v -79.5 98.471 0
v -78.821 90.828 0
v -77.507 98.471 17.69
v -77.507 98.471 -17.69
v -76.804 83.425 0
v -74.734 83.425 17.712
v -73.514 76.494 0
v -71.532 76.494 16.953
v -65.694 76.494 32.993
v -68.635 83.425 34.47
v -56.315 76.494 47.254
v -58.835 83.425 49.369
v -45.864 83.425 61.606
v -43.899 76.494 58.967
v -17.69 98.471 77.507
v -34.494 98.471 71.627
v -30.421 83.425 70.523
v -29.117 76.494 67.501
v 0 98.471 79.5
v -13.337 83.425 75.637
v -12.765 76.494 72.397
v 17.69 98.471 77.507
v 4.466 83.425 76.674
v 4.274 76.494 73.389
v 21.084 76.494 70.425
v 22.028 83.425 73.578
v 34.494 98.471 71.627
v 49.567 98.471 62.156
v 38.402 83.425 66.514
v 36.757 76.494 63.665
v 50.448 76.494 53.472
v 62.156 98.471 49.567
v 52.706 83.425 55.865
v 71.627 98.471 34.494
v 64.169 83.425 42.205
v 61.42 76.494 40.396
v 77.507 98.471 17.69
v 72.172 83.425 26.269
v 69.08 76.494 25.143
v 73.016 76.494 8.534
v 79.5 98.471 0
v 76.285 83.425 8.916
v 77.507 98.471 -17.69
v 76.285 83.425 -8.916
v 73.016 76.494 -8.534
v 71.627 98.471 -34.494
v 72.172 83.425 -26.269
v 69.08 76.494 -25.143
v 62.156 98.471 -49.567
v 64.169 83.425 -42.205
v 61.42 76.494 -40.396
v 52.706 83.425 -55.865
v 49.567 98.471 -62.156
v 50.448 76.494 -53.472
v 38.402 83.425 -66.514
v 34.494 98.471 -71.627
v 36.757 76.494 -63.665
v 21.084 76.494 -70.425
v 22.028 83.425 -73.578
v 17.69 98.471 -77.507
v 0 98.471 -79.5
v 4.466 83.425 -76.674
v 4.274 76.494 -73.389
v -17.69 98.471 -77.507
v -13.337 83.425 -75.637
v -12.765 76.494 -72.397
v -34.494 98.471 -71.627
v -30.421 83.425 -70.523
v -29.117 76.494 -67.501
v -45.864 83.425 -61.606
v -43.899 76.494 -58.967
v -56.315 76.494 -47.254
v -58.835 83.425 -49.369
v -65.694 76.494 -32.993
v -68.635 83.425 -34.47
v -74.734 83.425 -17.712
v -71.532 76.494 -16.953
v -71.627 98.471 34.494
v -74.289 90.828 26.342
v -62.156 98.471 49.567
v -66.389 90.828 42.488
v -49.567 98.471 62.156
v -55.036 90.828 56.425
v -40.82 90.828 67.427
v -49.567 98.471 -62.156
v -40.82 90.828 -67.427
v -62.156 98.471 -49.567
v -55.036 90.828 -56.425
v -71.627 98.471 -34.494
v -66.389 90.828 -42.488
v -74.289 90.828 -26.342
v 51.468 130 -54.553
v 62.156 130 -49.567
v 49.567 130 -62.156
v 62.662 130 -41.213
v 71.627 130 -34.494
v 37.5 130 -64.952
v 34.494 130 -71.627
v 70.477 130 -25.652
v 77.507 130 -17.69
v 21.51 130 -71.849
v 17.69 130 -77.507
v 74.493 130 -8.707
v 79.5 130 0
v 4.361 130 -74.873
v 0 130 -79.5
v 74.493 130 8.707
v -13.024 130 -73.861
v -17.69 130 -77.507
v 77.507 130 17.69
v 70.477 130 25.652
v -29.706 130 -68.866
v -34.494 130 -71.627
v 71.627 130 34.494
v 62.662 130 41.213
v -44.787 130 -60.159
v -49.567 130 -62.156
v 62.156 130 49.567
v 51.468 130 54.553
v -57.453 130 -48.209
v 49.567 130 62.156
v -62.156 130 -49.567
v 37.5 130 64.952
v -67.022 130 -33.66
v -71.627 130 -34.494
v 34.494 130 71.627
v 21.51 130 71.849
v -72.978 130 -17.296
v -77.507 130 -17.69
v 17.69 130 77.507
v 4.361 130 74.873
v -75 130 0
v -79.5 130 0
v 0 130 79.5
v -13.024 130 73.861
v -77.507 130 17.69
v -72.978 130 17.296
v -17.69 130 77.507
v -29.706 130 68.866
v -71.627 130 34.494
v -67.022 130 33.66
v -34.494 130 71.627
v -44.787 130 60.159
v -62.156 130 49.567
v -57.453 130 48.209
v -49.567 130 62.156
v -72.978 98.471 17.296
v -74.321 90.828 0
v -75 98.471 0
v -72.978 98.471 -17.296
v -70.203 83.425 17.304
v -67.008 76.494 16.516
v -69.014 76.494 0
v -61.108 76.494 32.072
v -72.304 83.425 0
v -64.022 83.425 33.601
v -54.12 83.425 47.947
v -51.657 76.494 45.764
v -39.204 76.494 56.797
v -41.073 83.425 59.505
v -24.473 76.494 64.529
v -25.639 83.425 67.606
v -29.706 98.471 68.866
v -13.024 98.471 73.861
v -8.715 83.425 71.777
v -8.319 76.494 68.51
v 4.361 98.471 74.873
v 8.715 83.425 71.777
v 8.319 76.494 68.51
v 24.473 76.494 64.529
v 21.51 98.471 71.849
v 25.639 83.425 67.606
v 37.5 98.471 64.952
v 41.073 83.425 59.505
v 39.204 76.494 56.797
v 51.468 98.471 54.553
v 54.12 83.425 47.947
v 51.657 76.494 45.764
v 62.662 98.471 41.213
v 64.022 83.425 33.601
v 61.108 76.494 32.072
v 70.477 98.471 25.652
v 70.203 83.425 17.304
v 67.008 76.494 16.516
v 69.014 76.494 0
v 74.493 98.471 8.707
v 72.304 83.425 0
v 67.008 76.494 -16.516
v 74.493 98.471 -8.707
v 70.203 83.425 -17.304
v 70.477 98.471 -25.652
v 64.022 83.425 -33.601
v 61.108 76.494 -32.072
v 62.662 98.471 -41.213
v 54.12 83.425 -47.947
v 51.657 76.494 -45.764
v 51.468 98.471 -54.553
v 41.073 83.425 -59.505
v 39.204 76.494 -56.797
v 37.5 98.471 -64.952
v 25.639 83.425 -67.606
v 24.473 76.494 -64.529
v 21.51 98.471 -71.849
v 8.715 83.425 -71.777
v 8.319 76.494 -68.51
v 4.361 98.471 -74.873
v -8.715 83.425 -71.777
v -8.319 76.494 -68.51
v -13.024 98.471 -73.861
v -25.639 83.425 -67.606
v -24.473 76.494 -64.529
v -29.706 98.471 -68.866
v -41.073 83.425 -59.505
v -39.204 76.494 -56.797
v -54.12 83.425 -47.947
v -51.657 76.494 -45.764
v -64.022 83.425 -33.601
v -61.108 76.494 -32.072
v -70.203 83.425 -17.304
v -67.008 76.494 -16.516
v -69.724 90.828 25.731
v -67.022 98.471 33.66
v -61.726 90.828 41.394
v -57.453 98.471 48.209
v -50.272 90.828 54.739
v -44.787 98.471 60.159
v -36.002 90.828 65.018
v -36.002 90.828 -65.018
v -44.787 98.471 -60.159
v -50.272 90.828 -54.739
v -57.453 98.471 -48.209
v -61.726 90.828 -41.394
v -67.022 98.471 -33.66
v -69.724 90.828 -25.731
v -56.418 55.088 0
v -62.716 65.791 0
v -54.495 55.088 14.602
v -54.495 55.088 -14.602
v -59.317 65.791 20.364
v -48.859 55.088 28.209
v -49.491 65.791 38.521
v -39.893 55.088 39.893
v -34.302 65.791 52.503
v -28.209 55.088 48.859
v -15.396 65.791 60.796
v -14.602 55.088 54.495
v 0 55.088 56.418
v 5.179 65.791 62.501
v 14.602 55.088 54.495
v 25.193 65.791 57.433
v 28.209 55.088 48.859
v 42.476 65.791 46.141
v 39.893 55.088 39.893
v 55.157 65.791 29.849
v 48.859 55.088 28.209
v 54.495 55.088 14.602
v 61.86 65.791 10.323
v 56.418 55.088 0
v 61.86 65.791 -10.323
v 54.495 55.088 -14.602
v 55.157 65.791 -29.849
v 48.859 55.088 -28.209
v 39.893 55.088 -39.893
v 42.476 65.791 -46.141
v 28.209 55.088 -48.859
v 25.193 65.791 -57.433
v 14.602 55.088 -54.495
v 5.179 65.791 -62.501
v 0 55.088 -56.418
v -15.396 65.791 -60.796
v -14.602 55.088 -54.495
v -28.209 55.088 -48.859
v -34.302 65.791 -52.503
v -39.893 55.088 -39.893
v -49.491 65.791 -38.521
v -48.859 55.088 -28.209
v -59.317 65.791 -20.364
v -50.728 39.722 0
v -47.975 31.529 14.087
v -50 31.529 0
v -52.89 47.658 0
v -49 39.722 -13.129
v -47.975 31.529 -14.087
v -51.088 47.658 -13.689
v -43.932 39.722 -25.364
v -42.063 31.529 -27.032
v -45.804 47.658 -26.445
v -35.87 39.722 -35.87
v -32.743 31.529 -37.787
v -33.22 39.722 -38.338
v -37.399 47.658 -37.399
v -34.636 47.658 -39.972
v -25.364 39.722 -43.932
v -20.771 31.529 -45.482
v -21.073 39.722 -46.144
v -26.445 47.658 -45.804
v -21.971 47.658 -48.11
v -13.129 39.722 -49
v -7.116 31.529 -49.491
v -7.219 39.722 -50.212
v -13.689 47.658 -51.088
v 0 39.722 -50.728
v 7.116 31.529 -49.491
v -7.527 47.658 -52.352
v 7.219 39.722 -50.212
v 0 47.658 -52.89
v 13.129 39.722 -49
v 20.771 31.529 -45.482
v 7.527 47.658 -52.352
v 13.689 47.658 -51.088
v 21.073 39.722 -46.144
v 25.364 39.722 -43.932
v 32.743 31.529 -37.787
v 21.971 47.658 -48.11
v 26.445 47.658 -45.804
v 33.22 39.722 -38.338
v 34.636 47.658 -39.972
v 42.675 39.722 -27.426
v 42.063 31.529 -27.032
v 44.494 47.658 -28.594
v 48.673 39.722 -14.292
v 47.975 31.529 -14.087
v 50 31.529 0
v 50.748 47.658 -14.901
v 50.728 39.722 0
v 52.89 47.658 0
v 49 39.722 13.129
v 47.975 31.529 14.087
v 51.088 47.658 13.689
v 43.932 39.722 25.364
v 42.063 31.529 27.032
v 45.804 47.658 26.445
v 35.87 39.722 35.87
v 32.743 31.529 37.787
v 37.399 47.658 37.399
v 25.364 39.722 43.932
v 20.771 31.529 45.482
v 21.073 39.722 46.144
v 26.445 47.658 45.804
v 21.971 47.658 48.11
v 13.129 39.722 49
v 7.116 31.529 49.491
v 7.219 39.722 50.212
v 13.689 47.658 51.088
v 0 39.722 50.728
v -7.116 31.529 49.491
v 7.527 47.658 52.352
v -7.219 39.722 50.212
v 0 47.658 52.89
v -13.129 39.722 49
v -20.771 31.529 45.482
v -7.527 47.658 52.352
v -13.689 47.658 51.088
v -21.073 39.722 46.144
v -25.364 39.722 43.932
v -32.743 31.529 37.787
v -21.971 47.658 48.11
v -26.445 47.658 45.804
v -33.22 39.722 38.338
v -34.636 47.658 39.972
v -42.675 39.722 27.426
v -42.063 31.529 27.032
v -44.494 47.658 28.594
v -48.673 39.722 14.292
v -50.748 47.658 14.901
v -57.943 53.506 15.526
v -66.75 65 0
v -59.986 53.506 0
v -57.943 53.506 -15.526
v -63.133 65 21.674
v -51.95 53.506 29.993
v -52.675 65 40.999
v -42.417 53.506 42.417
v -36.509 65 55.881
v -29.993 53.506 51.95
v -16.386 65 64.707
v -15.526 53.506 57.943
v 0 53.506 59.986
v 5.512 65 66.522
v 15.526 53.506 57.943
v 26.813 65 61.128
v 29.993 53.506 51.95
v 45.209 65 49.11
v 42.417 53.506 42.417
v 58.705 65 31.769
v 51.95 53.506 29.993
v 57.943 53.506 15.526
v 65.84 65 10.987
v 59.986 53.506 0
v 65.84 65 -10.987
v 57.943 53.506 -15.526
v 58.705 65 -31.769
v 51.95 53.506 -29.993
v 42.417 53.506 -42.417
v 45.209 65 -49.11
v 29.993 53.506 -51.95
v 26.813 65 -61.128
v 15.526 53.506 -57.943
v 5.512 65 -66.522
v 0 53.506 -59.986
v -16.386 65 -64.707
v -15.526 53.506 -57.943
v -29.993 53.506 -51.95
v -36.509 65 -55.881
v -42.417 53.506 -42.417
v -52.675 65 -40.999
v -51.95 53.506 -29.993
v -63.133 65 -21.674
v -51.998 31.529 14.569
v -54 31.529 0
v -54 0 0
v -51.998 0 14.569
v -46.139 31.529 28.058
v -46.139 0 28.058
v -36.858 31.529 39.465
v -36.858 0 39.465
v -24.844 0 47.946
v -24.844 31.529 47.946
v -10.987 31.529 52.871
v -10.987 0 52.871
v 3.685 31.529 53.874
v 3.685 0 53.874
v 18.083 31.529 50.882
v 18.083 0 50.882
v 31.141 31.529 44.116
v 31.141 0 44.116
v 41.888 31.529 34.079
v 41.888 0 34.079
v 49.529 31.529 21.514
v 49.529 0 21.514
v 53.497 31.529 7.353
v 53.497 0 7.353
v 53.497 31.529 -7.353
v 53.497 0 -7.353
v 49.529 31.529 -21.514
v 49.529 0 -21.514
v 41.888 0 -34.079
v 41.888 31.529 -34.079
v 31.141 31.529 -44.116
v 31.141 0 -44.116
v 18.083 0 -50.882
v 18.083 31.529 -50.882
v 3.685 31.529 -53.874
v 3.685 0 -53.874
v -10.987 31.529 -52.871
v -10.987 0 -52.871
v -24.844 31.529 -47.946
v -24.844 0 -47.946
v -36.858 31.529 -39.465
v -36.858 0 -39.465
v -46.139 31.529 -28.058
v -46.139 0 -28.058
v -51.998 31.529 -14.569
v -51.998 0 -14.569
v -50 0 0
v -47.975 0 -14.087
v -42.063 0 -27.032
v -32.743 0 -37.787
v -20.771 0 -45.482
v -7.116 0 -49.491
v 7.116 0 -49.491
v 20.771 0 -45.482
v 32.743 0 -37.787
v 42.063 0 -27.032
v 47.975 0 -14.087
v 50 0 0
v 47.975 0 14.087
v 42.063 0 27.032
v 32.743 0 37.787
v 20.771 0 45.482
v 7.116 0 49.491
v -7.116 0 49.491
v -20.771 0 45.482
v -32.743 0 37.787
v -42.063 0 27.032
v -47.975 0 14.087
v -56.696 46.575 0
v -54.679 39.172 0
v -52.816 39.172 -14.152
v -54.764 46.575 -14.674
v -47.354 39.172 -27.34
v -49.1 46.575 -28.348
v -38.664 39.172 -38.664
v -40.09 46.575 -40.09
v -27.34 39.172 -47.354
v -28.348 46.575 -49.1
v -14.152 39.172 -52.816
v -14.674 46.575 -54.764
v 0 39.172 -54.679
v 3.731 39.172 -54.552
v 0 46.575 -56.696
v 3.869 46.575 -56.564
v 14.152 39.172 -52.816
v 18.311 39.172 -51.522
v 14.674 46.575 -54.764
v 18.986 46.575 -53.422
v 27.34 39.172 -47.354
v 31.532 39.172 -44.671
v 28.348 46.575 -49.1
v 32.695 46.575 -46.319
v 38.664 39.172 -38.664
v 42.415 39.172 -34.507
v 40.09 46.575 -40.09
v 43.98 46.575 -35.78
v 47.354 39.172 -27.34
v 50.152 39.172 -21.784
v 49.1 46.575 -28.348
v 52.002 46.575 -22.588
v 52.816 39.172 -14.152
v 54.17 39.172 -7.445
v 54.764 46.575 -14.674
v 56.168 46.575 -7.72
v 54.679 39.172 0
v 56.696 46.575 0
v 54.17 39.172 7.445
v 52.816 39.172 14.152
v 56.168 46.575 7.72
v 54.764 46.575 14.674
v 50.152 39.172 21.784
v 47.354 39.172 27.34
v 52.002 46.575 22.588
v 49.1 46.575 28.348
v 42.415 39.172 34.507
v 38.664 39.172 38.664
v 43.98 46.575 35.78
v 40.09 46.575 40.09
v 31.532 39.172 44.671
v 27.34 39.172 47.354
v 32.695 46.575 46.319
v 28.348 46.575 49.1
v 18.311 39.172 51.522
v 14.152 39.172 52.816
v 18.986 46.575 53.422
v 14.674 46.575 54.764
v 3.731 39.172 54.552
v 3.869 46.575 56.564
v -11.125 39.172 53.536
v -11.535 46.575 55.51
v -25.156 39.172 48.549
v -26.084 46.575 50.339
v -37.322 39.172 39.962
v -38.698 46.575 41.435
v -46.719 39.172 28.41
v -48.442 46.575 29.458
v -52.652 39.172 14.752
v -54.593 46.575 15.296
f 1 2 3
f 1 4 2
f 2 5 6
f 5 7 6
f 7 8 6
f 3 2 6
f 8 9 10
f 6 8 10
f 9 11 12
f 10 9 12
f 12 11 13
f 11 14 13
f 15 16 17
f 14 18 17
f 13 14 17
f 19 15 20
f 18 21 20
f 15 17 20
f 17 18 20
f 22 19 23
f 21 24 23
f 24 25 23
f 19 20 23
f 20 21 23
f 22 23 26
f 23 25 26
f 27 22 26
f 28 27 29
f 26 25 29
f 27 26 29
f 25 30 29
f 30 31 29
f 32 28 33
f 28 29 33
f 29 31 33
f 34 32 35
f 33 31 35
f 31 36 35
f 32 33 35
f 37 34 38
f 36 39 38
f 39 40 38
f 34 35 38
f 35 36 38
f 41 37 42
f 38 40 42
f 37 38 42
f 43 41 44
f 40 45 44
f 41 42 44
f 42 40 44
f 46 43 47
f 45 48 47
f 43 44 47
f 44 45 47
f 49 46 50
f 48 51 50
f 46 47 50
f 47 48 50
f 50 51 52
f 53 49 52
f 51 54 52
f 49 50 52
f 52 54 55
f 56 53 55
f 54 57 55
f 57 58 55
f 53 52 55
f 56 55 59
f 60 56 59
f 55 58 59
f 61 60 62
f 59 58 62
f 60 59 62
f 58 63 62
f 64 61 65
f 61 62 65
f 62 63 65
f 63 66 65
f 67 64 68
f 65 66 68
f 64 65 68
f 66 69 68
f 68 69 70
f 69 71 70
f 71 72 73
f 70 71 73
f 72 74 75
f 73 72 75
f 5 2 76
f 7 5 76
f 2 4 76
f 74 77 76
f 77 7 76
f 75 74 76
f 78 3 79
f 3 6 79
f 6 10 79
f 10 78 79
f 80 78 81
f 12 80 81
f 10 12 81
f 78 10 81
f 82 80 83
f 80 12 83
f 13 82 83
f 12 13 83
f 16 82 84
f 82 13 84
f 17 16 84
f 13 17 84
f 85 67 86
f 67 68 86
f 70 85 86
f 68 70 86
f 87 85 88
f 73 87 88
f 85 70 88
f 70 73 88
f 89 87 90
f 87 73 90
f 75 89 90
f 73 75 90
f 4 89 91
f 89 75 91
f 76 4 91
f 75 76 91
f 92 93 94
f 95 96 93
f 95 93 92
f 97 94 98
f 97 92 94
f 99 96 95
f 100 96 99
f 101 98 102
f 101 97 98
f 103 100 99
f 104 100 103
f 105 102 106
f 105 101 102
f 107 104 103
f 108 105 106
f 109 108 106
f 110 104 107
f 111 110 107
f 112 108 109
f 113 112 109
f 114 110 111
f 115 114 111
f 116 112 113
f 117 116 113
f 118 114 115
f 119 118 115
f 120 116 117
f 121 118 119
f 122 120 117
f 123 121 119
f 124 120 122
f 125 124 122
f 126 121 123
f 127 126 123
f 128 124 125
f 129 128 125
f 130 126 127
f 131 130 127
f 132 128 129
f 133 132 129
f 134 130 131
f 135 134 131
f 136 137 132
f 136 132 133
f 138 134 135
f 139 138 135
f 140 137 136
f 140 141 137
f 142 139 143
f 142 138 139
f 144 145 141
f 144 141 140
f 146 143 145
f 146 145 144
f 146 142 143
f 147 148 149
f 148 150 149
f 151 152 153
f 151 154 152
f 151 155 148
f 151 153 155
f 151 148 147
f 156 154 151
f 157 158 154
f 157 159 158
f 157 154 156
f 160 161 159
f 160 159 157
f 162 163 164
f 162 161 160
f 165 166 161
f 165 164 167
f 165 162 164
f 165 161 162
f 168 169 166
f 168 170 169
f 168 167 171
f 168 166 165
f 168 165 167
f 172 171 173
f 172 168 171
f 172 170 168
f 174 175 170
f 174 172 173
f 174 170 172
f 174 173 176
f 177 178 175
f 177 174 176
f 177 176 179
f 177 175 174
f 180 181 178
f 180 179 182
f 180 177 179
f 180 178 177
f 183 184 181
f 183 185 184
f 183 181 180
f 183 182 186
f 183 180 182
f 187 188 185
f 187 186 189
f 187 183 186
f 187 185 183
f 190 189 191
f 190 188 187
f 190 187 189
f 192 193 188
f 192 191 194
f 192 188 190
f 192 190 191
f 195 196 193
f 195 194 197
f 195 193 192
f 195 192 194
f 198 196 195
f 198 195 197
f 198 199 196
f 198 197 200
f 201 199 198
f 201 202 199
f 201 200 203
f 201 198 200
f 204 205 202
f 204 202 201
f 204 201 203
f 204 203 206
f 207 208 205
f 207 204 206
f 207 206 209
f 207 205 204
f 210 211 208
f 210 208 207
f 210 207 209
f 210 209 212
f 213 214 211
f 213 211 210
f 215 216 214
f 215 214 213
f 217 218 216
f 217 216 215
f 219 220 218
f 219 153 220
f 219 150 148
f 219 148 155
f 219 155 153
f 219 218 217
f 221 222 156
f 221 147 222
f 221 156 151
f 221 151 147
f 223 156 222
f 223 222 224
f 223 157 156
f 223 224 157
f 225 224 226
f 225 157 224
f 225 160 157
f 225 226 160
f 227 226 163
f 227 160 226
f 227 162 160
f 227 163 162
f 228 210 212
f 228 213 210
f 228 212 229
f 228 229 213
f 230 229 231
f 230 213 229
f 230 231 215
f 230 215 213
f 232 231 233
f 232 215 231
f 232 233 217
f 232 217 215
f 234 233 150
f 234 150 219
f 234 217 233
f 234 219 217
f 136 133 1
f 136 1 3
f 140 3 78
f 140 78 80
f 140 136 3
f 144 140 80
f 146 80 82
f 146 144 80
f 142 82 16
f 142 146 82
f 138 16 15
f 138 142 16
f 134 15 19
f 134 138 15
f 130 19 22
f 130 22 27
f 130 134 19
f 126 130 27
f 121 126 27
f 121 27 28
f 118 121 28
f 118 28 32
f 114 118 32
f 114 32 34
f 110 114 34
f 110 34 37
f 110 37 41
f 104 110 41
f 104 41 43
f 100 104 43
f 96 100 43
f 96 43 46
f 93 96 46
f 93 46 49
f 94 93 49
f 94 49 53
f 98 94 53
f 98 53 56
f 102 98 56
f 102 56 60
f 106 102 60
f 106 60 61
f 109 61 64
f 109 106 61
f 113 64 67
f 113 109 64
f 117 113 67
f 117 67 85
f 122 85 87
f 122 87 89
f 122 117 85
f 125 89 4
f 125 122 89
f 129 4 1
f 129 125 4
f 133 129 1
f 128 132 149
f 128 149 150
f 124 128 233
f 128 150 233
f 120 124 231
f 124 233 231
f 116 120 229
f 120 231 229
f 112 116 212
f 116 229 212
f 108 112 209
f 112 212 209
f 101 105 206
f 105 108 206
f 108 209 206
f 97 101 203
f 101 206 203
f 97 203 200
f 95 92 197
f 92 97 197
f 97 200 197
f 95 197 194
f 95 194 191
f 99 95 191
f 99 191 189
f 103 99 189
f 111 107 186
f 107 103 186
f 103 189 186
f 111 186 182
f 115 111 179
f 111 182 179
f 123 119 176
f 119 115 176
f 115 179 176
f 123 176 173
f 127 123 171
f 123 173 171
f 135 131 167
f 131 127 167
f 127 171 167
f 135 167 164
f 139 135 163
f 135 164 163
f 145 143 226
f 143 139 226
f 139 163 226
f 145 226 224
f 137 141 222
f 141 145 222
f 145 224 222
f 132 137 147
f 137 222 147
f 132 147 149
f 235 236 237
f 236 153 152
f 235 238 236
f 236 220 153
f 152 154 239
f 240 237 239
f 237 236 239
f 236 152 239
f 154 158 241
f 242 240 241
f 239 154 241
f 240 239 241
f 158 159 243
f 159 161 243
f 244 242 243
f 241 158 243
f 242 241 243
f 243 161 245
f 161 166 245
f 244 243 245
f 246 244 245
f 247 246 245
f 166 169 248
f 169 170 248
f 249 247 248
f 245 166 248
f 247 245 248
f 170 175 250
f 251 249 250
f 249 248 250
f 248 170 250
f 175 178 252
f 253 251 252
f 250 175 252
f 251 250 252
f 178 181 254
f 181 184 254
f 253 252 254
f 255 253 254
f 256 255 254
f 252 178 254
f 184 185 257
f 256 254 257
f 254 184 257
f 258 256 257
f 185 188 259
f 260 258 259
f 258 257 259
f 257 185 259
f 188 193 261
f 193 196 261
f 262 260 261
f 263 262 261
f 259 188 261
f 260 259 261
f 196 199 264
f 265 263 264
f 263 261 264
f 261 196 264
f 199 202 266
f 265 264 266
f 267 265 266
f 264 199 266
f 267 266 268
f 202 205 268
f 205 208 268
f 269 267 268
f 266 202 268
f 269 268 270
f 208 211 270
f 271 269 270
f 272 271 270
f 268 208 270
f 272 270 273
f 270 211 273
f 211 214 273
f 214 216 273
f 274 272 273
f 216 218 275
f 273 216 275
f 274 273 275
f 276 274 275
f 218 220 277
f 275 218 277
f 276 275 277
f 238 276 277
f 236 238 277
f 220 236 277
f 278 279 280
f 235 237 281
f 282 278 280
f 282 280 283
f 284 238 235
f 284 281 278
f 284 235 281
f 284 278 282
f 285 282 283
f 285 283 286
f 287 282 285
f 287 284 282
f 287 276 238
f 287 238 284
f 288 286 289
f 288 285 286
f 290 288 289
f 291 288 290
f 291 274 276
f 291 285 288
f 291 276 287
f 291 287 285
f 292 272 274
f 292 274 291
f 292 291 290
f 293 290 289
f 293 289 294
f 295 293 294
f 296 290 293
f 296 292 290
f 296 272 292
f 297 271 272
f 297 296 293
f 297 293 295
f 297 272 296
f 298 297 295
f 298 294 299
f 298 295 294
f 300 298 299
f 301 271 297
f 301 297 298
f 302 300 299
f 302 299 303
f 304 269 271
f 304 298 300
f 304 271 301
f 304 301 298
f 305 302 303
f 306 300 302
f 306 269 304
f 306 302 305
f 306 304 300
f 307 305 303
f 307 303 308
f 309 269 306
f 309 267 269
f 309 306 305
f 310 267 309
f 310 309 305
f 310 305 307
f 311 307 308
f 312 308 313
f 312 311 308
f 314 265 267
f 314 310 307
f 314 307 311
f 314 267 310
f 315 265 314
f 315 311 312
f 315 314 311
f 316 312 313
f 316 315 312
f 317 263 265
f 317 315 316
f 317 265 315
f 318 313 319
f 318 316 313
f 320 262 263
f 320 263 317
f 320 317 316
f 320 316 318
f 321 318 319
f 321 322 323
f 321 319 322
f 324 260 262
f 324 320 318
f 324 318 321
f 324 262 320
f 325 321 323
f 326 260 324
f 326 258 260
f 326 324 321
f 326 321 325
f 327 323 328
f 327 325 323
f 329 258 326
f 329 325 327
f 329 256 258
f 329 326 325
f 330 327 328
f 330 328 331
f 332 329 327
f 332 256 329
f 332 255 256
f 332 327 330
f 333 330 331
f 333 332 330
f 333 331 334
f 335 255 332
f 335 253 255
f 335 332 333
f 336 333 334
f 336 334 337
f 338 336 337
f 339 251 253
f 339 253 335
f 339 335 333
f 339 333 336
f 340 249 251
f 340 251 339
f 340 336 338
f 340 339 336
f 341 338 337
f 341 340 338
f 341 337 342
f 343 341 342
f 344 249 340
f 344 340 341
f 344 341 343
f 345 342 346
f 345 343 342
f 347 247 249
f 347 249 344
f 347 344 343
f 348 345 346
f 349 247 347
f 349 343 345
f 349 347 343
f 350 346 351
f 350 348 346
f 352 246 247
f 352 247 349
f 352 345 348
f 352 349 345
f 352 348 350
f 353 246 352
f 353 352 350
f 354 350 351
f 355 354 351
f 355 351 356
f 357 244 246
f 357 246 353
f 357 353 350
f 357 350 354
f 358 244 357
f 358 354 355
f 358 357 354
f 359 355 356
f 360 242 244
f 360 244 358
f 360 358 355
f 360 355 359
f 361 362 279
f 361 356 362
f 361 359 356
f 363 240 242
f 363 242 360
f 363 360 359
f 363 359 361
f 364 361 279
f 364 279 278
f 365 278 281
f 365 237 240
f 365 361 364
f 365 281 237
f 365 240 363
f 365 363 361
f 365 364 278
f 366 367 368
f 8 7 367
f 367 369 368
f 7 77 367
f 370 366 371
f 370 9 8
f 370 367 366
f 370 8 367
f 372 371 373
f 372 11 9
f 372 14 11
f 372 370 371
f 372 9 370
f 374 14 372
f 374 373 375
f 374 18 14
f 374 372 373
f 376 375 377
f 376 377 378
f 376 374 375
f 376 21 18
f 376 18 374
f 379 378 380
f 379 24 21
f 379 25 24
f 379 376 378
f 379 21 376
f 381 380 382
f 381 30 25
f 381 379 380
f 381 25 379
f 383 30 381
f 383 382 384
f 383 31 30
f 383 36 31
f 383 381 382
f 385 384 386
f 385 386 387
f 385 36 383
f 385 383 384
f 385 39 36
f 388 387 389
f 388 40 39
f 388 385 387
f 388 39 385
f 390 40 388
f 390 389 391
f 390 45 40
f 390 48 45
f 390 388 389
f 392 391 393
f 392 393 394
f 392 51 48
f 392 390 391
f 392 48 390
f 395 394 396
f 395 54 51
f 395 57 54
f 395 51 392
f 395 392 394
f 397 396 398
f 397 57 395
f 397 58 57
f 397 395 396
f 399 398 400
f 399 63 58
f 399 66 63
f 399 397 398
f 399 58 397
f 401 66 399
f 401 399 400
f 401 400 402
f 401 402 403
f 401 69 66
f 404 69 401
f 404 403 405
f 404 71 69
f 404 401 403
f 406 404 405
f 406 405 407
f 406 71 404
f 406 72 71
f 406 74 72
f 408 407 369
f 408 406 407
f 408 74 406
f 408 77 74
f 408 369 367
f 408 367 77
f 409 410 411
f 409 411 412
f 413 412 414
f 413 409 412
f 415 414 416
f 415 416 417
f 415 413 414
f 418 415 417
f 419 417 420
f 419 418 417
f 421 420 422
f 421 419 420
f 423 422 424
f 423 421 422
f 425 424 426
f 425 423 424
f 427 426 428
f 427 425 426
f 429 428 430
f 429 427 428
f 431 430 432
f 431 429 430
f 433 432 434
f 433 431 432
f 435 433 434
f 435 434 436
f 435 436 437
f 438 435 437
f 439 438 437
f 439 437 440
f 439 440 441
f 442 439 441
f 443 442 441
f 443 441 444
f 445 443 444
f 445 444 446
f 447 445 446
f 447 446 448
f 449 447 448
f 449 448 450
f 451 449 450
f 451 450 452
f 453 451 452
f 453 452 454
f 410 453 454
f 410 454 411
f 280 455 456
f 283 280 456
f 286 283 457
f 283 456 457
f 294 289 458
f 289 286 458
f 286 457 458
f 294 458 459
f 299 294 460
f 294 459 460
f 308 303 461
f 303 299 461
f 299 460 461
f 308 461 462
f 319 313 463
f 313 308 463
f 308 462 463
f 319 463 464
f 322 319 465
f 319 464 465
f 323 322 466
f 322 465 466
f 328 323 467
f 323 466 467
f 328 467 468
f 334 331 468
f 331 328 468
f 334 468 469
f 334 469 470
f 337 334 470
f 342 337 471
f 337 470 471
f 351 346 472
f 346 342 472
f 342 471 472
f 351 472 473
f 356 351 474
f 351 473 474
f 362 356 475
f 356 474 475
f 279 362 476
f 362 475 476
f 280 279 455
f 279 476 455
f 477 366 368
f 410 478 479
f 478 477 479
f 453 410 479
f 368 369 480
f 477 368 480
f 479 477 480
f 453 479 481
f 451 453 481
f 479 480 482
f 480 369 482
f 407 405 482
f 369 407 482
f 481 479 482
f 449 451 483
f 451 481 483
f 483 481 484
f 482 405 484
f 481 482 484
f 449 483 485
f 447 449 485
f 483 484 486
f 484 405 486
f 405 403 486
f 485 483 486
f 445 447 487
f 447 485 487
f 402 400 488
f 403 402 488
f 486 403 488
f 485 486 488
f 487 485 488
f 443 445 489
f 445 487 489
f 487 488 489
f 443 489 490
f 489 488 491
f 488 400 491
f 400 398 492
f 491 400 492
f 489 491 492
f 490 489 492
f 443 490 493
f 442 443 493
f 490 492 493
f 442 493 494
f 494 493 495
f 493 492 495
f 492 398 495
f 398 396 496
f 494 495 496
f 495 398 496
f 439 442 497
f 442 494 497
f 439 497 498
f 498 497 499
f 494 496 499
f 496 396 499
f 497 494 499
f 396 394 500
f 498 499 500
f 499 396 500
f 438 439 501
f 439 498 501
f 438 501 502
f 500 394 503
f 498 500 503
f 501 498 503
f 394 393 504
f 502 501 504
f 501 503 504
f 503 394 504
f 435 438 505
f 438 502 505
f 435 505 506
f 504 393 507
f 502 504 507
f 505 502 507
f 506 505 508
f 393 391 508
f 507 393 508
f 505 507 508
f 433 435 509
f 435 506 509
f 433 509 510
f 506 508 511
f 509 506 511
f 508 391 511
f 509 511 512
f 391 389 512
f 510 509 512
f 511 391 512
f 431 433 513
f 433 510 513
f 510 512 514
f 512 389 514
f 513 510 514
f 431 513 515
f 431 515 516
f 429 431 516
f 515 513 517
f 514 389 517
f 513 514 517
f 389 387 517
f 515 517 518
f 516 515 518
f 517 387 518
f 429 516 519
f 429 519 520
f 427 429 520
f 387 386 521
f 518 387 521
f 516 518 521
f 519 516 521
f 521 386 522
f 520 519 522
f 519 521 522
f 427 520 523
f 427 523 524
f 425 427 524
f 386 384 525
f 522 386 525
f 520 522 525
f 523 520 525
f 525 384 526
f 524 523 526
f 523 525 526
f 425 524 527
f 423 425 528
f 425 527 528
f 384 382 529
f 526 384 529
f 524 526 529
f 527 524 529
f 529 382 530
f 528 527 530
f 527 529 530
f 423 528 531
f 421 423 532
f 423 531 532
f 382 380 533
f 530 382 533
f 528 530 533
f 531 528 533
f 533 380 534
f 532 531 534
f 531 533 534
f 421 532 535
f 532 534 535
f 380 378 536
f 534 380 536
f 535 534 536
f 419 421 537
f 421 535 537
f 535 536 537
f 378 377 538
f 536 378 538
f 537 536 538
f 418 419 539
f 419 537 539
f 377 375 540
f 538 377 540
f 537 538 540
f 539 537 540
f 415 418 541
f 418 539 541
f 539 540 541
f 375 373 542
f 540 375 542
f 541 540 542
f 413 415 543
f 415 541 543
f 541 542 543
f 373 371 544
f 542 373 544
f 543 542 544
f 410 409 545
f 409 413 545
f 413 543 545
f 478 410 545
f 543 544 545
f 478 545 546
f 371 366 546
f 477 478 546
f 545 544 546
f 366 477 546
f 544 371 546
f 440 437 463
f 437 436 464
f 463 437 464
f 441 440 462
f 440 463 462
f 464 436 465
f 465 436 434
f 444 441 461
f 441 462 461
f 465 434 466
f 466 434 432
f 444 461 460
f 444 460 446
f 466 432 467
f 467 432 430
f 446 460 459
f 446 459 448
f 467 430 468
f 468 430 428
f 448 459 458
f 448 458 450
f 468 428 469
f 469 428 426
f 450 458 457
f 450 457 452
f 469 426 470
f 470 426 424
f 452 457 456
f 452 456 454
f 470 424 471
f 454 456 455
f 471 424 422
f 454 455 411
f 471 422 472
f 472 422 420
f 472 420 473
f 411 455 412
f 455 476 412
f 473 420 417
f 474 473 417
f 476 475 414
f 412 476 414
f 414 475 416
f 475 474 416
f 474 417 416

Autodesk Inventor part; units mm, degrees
ref_plane "YZ Plane" through (0, 0, 0) normal (1, 0, 0) x (0, 1, 0)
ref_plane "XZ Plane" through (0, 0, 0) normal (0, 1, 0) x (-1, 0, 0)
ref_plane "XY Plane" through (0, 0, 0) normal (0, 0, 1) x (1, 0, 0)
sketch "Sketch1" plane through (0, 0, 0) normal (0, 0, 1) x (1, 0, 0)
  line L0 (0, 0) -> (0, 130)
  line L1 (-54, 0) -> (-54, 31.5294)
  line L2 (-79.5, 98.4706) -> (-79.5, 130)
  line L3 (-79.5, 130) -> (-75, 130)
  line L4 (-75, 130) -> (-75, 98.4706)
  line L5 (-50, 31.5294) -> (-50, 0)
  line L6 (-73.5135, 76.4935) -> (-59.9865, 53.5065)
  line L7 (-69.0135, 76.4935) -> (-56.4175, 55.0885)
  arc A0 (-75, 98.4706) -> (-69.0135, 76.4935) centre (-31.6667, 98.4706) ccw
  arc A1 (-79.5, 98.4706) -> (-73.5135, 76.4935) centre (-36.1667, 98.4706) ccw
  arc A2 (-54, 31.5294) -> (-59.9865, 53.5065) centre (-97.3333, 31.5294) ccw
  arc A3 (-50, 31.5294) -> (-56.4175, 55.0885) centre (-96.4526, 31.5294) ccw
  line L8 (-54, 0) -> (-50, 0)
  point P0 (-54, 43.3333)
  point P1 (-79.5, 86.6667)
  point P2 (-77.25, 130)
  point P3 (-52, 0)
  dimension "d0" = 4
  dimension "d1" = 108
  dimension "d2" = 4.5
  dimension "d3" = 159
  dimension "d5" = 43.3333
  dimension "d6" = 43.3333
  dimension "d8" = 43.3333
  dimension "d13" = 130
  dimension "d15" = 43.3333
revolve "Revolution1" add sketch "Sketch1" angle 360 about axis through (0, 0, 0) along (0, 1, 0)
equation "\"d0\" = s1"
equation "\"d1\" = dh_"
equation "\"d2\" = s_"
equation "\"d3\" = Dh"
equation "\"d5\" = 0.333333 * L"
equation "\"d6\" = 0.333333 * L"
equation "\"d8\" = 0.333333 * L"
equation "\"d13\" = L"
equation "\"d15\" = 0.333333 * L"
equation "\"L\" = 130"
equation "\"s_\" = 4.5"
equation "\"Dh\" = 159"
equation "\"dh_\" = 108"
equation "\"s1\" = 4"
properties part number "Reducer К 159x4.5-108x4 GOST 17378-83" material "Steel, Mild"
